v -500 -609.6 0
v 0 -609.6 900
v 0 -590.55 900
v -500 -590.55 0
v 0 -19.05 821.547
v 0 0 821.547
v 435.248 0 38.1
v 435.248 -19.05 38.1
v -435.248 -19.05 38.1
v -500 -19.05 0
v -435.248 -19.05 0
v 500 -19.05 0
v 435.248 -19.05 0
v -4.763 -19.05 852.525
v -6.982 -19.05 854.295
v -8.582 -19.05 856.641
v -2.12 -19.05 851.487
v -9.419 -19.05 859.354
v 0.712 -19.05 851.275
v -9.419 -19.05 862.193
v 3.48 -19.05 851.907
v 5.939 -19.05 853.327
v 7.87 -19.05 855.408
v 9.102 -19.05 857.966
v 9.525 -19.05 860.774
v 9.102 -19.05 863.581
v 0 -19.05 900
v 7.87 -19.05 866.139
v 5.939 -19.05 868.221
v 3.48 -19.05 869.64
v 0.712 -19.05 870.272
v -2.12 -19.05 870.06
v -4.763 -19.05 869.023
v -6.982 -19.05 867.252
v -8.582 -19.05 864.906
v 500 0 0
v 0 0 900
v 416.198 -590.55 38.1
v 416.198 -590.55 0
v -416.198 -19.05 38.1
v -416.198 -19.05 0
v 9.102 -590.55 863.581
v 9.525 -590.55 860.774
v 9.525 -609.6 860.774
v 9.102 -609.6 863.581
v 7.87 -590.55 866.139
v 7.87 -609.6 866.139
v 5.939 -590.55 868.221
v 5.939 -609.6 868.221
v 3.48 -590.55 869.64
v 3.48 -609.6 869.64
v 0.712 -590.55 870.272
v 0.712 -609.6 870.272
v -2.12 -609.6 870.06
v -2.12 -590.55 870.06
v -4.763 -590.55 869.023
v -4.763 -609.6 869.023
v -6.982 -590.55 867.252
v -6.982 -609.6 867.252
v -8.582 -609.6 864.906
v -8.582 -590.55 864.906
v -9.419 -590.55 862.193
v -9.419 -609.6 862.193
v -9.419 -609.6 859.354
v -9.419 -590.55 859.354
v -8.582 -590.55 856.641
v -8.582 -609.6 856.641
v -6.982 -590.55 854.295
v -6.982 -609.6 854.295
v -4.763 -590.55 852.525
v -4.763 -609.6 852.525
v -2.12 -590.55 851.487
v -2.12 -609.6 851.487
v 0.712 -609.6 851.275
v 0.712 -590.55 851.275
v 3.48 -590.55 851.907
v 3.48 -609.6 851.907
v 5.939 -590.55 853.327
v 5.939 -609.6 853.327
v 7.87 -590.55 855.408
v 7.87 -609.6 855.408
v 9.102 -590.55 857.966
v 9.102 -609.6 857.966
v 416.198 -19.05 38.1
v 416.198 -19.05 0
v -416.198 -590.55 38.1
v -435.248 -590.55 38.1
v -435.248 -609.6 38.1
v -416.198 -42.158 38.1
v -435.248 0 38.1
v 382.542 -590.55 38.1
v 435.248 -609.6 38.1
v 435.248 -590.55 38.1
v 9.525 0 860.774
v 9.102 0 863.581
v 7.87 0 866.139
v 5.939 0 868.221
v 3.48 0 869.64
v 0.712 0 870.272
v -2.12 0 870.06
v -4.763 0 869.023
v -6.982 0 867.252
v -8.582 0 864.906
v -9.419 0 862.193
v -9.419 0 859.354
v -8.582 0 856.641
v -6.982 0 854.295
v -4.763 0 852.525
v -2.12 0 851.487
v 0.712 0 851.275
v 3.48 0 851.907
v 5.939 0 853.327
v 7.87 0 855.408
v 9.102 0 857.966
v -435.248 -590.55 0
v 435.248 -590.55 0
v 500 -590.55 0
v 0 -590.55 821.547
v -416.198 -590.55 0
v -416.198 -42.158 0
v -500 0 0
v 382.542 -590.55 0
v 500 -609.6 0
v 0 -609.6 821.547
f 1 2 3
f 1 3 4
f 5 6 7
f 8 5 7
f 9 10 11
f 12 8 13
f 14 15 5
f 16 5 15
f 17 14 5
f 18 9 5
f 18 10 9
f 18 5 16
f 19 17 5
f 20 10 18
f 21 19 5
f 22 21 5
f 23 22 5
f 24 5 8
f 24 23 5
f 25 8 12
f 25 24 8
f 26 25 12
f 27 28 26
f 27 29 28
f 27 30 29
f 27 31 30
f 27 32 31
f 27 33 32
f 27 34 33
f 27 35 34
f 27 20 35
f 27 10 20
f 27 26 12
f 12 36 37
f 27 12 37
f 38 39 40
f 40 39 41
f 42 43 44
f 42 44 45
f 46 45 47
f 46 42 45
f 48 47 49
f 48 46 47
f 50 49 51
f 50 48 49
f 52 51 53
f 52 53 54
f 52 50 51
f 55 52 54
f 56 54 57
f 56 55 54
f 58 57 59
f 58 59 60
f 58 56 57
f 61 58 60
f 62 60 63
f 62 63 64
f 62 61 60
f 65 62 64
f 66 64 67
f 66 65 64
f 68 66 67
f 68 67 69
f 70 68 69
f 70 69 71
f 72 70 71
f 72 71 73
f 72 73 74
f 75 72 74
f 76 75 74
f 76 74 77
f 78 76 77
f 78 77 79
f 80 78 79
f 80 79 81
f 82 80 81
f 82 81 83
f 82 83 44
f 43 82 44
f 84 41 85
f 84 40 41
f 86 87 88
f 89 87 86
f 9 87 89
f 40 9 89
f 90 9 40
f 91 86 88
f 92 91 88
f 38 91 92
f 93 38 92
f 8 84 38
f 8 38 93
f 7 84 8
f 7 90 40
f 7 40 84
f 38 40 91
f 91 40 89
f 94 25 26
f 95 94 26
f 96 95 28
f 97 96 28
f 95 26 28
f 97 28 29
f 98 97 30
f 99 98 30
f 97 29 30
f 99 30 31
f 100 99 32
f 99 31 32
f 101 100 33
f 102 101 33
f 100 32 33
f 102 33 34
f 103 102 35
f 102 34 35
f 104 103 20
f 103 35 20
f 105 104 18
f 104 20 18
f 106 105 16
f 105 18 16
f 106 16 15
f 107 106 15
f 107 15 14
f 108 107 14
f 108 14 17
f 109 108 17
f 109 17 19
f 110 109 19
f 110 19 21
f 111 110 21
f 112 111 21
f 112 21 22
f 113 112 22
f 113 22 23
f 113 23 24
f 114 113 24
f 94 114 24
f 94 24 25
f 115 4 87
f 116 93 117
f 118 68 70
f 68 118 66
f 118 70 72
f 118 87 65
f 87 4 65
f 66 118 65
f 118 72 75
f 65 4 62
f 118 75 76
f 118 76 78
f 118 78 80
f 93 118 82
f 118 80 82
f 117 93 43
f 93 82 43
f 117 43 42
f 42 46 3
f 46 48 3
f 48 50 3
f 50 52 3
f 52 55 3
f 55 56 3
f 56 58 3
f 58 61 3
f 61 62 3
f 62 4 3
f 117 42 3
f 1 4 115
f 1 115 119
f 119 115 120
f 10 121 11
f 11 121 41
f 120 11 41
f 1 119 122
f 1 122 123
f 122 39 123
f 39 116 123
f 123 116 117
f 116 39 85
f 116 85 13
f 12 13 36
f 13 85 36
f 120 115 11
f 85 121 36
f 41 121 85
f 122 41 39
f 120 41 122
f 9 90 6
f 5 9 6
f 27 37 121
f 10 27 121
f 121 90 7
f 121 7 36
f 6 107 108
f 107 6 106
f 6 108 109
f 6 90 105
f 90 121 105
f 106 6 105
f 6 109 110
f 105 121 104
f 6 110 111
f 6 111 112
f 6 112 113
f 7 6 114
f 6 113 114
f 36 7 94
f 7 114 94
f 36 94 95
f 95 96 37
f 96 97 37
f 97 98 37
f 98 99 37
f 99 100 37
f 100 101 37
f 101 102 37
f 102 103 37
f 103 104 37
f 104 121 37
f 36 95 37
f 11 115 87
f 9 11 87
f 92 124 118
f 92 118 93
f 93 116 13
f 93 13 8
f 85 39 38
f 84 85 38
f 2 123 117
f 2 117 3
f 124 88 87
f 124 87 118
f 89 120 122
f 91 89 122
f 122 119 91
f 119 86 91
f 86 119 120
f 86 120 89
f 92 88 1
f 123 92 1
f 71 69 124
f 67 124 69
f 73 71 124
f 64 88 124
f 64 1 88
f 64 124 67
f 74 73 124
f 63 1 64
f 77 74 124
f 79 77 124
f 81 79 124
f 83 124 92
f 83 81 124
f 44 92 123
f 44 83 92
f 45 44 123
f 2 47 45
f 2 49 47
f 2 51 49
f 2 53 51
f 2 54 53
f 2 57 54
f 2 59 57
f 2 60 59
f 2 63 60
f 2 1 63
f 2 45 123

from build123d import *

# Parameters (mm, degrees)
F1_DEPTH = 19.05
F2_DEPTH = 19.05
F3_R     = 9.525
F4_DEPTH = 25
F5_W     = 19.05
F5_H     = 38.1
F6_DEPTH = 285.75
F9_DEPTH = 38.1


# Not quite as in the source:
# - a feature names something its author has since deleted; it is built from what else it names


with BuildPart() as f1:
    # F0 (on Front) → F1 (new body)
    with BuildSketch(Plane.XZ):
        Polygon((435.2484990698, 38.1), (-435.2484990698, 38.1), (-456.4151657365, 0), (456.4151657365, 0), align=None)
    extrude(amount=F1_DEPTH)

    # F0 (on Front) → F2 (join)
    with BuildSketch(Plane.XZ):
        Polygon((500, 0), (478.8333333333, 38.1), (435.2484990698, 38.1), (456.4151657365, 0), align=None)
        Polygon((478.8333333333, 38.1), (21.7924171318, 860.7736491628), (0, 821.5472983257), (435.2484990698, 38.1), align=None)
        Polygon((21.7924171318, 860.7736491628), (0, 900), (-21.7924171318, 860.7736491628), (0, 821.5472983257), align=None)
        Polygon((0, 821.5472983257), (-21.7924171318, 860.7736491628), (-478.8333333333, 38.1), (-435.2484990698, 38.1), align=None)
        Polygon((-435.2484990698, 38.1), (-478.8333333333, 38.1), (-500, 0), (-456.4151657365, 0), align=None)
    extrude(amount=F2_DEPTH)

    # F3 (on face) → F4 (cut)
    with BuildSketch(Plane.XZ.offset(19.05)):
        with Locations((0, 860.7736491628)):
            Circle(F3_R)
    extrude(amount=-F4_DEPTH, mode=Mode.SUBTRACT)

    # F5 (on face) → F6 (join)
    with BuildSketch(Plane.XZ.offset(19.05)):
        with Locations((-425.7234990698, 19.05)):
            Rectangle(F5_W, F5_H)
        with Locations((425.7234990698, 19.05)):
            Rectangle(F5_W, F5_H)
    extrude(amount=F6_DEPTH)

    # F7: F1 across face


with BuildPart() as f1_1:
    add(f1.part)
    add(f1.part.mirror(Plane(origin=(425.7234990698, -304.8, 19.05), x_dir=(1, 0, 0), z_dir=(0, -1, 0))))

    # F8 (on Top) → F9 (join, through all)
    with BuildSketch(Plane.XY):
        Polygon((416.1984990698, -590.55), (-416.1984990698, -19.05), (-416.1984990698, -42.1577389905), (382.5417841626, -590.55), align=None)
    extrude(amount=F9_DEPTH)


solid = f1_1.part
